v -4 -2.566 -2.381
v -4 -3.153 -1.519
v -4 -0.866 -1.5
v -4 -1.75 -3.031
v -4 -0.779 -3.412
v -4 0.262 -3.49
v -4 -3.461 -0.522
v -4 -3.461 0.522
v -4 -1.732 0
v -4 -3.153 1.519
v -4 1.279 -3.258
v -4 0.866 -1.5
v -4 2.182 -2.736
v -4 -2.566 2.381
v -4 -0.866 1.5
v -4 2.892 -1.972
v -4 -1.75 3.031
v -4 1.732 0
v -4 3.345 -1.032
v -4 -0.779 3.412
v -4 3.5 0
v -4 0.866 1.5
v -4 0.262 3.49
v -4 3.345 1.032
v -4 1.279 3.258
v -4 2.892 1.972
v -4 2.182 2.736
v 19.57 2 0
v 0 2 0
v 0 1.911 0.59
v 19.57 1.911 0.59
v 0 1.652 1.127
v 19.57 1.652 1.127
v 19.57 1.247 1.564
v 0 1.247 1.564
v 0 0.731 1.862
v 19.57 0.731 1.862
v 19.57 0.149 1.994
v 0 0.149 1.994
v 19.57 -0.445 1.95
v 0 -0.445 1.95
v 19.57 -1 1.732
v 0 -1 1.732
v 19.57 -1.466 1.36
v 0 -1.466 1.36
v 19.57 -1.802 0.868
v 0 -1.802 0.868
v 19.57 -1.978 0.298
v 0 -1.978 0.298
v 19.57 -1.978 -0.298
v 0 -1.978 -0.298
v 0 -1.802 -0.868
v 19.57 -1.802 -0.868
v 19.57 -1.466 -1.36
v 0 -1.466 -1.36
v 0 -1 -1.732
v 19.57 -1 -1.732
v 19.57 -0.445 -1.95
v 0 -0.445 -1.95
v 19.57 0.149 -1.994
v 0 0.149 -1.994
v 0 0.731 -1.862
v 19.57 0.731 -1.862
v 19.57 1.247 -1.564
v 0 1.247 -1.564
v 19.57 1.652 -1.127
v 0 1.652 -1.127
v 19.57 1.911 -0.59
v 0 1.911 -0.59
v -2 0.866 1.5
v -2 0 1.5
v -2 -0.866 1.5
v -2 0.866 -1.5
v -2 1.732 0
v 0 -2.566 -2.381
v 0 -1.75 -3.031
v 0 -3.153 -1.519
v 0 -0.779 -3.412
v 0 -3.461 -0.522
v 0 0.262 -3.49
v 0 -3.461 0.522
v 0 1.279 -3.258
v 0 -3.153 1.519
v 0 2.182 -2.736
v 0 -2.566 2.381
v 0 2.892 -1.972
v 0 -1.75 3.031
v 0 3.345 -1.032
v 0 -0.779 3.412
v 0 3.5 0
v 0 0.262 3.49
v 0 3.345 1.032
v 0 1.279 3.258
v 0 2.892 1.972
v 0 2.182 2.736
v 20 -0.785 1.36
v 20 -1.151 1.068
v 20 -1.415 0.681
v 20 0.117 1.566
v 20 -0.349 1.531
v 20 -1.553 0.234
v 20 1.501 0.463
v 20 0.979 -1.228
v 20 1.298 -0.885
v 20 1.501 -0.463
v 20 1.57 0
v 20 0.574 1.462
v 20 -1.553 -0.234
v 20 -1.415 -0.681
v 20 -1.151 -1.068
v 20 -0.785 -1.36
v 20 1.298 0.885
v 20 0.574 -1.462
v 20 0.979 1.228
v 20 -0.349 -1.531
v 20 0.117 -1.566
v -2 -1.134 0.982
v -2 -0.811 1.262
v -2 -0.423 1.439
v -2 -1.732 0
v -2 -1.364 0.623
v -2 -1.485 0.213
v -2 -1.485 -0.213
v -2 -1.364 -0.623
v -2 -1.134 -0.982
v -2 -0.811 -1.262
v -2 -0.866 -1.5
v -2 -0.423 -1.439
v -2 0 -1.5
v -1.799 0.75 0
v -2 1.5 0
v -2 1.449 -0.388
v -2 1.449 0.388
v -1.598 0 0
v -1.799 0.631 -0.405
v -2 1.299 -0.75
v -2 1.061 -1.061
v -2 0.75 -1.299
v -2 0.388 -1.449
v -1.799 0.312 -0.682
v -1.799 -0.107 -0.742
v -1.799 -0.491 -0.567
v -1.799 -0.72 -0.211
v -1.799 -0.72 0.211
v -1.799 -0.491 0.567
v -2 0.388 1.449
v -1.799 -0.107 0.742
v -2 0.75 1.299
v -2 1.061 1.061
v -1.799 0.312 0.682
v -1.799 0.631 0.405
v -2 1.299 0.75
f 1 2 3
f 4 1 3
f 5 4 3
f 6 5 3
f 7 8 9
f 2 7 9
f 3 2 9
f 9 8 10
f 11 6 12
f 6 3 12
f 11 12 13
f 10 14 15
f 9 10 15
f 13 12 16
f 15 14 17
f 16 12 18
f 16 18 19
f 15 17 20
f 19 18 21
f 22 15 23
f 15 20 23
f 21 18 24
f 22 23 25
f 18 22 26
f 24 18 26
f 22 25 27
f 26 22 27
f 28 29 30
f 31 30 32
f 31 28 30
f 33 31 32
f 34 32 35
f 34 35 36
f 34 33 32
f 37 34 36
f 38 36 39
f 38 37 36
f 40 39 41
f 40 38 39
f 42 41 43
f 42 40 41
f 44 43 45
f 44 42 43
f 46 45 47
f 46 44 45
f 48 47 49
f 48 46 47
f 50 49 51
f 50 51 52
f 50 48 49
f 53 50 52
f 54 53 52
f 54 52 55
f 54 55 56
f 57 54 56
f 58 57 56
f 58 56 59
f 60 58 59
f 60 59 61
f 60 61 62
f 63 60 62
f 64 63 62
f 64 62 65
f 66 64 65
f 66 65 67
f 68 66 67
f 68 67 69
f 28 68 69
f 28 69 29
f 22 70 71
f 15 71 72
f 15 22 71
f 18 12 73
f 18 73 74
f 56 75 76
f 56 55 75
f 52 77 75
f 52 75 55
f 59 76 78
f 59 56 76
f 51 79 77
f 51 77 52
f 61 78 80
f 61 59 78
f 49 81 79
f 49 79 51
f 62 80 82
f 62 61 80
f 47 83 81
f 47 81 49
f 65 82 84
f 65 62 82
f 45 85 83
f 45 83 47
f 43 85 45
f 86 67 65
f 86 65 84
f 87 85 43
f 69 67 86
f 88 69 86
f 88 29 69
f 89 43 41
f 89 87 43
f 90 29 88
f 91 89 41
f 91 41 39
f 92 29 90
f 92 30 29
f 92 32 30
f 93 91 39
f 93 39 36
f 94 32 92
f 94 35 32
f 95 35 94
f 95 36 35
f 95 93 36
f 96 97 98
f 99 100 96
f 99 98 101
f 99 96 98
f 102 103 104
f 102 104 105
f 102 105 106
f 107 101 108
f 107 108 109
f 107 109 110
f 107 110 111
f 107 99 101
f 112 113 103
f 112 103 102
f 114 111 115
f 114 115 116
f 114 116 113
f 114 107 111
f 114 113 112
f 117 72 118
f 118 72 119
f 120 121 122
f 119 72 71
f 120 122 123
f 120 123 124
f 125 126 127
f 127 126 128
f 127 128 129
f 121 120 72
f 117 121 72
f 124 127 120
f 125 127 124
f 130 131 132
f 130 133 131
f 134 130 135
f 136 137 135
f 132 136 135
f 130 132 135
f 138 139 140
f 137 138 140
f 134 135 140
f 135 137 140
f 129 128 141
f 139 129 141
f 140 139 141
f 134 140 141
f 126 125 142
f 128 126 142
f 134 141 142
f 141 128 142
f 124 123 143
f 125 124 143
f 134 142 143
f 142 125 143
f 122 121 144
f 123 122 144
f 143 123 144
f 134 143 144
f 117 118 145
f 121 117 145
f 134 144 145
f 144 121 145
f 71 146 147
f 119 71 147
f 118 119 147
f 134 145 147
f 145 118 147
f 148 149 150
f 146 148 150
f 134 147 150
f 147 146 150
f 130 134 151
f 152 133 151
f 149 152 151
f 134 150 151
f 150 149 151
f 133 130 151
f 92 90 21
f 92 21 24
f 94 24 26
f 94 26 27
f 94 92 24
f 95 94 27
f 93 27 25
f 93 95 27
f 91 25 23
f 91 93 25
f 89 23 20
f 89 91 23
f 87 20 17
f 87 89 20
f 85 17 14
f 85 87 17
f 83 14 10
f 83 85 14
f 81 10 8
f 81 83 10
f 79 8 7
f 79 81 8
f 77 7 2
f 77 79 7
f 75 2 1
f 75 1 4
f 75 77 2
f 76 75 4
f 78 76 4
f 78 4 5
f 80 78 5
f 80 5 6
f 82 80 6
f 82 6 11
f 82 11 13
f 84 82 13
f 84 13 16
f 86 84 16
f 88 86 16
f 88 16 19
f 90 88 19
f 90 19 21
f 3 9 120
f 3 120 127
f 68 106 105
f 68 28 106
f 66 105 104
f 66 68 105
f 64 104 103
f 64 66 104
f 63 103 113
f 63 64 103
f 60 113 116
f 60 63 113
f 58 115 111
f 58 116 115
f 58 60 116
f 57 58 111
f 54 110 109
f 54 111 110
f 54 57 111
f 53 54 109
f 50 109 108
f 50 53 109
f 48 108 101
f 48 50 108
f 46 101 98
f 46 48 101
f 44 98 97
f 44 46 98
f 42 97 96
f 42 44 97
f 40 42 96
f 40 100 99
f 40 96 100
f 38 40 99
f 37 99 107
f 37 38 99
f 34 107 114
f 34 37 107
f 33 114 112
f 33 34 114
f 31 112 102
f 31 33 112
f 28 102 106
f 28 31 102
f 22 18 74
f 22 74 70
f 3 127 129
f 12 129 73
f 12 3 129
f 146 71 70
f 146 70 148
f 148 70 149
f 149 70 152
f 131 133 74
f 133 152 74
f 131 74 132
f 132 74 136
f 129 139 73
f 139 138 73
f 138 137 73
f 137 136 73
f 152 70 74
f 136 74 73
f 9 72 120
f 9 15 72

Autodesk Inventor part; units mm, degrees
sketch "Sketch_1" plane through (0, 0, 0) normal (0, 0, 1) x (1, 0, 0)
  line L0 (20, 0) -> (-4, 0)
  line L1 (-4, 0) -> (-4, 3.5)
  line L2 (-4, 3.5) -> (0, 3.5)
  line L3 (0, 3.5) -> (0, 2)
  line L4 (0, 2) -> (19.5705, 2)
  line L5 (19.5705, 2) -> (20, 1.5705)
  line L6 (20, 1.5705) -> (20, 0)
  line L7 (20, 0) -> (-4, 0)
revolve "Revolution1" add sketch "Sketch_1" angle 360 about axis through (20, 0, 0) along (1, 0, 0)
thread "Thread1" size "M4x0.7" class "6g" standard "ISO Metric profile" length 19.5 offset 0.5
sketch "Sketch_4" plane through (0, 0, 0) normal (0, 0, 1) x (1, 0, 0)
  line L0 (-1.5981, 0) -> (-4, 0)
  line L1 (-4, 0) -> (-4, 1.5)
  line L2 (-4, 1.5) -> (-2, 1.5)
  line L3 (-2, 1.5) -> (-1.5981, 0)
  line L4 (-1.5981, 0) -> (-4, 0)
revolve "Revolution2" cut sketch "Sketch_4" angle 360 about axis through (-1.5981, 0, 0) along (1, 0, 0)
sketch "Sketch_3" plane through (-4, 0, 0) normal (1, 0, 0) x (0, 0, -1)
  line L0 (-1.5, 0.866) -> (-1.5, -0.866)
  line L1 (-1.5, -0.866) -> (0, -1.7321)
  line L2 (0, -1.7321) -> (1.5, -0.866)
  line L3 (1.5, -0.866) -> (1.5, 0.866)
  line L4 (1.5, 0.866) -> (0, 1.7321)
  line L5 (0, 1.7321) -> (-1.5, 0.866)
extrude "Extrusion1" cut sketch "Sketch_3" along normal blind 2
ref_plane "bolt_XY" through (0, 0, 0) normal (1, 0, 0) x (0, 0, -1)
ref_plane "bolt_YZ" through (0, 0, 0) normal (0, 0, -1) x (0, 1, 0)
ref_plane "bolt_ZX" through (0, 0, 0) normal (0, 1, 0) x (1, 0, 0)
ref_plane "nut_XY" through (20, 0, 0) normal (1, 0, 0) x (0, 0, -1)
ref_plane "nut_YZ" through (20, 0, 0) normal (0, 0, -1) x (0, 1, 0)
ref_plane "nut_ZX" through (20, 0, 0) normal (0, 1, 0) x (1, 0, 0)
properties part number "CBM4-20" material "MISUMI"
